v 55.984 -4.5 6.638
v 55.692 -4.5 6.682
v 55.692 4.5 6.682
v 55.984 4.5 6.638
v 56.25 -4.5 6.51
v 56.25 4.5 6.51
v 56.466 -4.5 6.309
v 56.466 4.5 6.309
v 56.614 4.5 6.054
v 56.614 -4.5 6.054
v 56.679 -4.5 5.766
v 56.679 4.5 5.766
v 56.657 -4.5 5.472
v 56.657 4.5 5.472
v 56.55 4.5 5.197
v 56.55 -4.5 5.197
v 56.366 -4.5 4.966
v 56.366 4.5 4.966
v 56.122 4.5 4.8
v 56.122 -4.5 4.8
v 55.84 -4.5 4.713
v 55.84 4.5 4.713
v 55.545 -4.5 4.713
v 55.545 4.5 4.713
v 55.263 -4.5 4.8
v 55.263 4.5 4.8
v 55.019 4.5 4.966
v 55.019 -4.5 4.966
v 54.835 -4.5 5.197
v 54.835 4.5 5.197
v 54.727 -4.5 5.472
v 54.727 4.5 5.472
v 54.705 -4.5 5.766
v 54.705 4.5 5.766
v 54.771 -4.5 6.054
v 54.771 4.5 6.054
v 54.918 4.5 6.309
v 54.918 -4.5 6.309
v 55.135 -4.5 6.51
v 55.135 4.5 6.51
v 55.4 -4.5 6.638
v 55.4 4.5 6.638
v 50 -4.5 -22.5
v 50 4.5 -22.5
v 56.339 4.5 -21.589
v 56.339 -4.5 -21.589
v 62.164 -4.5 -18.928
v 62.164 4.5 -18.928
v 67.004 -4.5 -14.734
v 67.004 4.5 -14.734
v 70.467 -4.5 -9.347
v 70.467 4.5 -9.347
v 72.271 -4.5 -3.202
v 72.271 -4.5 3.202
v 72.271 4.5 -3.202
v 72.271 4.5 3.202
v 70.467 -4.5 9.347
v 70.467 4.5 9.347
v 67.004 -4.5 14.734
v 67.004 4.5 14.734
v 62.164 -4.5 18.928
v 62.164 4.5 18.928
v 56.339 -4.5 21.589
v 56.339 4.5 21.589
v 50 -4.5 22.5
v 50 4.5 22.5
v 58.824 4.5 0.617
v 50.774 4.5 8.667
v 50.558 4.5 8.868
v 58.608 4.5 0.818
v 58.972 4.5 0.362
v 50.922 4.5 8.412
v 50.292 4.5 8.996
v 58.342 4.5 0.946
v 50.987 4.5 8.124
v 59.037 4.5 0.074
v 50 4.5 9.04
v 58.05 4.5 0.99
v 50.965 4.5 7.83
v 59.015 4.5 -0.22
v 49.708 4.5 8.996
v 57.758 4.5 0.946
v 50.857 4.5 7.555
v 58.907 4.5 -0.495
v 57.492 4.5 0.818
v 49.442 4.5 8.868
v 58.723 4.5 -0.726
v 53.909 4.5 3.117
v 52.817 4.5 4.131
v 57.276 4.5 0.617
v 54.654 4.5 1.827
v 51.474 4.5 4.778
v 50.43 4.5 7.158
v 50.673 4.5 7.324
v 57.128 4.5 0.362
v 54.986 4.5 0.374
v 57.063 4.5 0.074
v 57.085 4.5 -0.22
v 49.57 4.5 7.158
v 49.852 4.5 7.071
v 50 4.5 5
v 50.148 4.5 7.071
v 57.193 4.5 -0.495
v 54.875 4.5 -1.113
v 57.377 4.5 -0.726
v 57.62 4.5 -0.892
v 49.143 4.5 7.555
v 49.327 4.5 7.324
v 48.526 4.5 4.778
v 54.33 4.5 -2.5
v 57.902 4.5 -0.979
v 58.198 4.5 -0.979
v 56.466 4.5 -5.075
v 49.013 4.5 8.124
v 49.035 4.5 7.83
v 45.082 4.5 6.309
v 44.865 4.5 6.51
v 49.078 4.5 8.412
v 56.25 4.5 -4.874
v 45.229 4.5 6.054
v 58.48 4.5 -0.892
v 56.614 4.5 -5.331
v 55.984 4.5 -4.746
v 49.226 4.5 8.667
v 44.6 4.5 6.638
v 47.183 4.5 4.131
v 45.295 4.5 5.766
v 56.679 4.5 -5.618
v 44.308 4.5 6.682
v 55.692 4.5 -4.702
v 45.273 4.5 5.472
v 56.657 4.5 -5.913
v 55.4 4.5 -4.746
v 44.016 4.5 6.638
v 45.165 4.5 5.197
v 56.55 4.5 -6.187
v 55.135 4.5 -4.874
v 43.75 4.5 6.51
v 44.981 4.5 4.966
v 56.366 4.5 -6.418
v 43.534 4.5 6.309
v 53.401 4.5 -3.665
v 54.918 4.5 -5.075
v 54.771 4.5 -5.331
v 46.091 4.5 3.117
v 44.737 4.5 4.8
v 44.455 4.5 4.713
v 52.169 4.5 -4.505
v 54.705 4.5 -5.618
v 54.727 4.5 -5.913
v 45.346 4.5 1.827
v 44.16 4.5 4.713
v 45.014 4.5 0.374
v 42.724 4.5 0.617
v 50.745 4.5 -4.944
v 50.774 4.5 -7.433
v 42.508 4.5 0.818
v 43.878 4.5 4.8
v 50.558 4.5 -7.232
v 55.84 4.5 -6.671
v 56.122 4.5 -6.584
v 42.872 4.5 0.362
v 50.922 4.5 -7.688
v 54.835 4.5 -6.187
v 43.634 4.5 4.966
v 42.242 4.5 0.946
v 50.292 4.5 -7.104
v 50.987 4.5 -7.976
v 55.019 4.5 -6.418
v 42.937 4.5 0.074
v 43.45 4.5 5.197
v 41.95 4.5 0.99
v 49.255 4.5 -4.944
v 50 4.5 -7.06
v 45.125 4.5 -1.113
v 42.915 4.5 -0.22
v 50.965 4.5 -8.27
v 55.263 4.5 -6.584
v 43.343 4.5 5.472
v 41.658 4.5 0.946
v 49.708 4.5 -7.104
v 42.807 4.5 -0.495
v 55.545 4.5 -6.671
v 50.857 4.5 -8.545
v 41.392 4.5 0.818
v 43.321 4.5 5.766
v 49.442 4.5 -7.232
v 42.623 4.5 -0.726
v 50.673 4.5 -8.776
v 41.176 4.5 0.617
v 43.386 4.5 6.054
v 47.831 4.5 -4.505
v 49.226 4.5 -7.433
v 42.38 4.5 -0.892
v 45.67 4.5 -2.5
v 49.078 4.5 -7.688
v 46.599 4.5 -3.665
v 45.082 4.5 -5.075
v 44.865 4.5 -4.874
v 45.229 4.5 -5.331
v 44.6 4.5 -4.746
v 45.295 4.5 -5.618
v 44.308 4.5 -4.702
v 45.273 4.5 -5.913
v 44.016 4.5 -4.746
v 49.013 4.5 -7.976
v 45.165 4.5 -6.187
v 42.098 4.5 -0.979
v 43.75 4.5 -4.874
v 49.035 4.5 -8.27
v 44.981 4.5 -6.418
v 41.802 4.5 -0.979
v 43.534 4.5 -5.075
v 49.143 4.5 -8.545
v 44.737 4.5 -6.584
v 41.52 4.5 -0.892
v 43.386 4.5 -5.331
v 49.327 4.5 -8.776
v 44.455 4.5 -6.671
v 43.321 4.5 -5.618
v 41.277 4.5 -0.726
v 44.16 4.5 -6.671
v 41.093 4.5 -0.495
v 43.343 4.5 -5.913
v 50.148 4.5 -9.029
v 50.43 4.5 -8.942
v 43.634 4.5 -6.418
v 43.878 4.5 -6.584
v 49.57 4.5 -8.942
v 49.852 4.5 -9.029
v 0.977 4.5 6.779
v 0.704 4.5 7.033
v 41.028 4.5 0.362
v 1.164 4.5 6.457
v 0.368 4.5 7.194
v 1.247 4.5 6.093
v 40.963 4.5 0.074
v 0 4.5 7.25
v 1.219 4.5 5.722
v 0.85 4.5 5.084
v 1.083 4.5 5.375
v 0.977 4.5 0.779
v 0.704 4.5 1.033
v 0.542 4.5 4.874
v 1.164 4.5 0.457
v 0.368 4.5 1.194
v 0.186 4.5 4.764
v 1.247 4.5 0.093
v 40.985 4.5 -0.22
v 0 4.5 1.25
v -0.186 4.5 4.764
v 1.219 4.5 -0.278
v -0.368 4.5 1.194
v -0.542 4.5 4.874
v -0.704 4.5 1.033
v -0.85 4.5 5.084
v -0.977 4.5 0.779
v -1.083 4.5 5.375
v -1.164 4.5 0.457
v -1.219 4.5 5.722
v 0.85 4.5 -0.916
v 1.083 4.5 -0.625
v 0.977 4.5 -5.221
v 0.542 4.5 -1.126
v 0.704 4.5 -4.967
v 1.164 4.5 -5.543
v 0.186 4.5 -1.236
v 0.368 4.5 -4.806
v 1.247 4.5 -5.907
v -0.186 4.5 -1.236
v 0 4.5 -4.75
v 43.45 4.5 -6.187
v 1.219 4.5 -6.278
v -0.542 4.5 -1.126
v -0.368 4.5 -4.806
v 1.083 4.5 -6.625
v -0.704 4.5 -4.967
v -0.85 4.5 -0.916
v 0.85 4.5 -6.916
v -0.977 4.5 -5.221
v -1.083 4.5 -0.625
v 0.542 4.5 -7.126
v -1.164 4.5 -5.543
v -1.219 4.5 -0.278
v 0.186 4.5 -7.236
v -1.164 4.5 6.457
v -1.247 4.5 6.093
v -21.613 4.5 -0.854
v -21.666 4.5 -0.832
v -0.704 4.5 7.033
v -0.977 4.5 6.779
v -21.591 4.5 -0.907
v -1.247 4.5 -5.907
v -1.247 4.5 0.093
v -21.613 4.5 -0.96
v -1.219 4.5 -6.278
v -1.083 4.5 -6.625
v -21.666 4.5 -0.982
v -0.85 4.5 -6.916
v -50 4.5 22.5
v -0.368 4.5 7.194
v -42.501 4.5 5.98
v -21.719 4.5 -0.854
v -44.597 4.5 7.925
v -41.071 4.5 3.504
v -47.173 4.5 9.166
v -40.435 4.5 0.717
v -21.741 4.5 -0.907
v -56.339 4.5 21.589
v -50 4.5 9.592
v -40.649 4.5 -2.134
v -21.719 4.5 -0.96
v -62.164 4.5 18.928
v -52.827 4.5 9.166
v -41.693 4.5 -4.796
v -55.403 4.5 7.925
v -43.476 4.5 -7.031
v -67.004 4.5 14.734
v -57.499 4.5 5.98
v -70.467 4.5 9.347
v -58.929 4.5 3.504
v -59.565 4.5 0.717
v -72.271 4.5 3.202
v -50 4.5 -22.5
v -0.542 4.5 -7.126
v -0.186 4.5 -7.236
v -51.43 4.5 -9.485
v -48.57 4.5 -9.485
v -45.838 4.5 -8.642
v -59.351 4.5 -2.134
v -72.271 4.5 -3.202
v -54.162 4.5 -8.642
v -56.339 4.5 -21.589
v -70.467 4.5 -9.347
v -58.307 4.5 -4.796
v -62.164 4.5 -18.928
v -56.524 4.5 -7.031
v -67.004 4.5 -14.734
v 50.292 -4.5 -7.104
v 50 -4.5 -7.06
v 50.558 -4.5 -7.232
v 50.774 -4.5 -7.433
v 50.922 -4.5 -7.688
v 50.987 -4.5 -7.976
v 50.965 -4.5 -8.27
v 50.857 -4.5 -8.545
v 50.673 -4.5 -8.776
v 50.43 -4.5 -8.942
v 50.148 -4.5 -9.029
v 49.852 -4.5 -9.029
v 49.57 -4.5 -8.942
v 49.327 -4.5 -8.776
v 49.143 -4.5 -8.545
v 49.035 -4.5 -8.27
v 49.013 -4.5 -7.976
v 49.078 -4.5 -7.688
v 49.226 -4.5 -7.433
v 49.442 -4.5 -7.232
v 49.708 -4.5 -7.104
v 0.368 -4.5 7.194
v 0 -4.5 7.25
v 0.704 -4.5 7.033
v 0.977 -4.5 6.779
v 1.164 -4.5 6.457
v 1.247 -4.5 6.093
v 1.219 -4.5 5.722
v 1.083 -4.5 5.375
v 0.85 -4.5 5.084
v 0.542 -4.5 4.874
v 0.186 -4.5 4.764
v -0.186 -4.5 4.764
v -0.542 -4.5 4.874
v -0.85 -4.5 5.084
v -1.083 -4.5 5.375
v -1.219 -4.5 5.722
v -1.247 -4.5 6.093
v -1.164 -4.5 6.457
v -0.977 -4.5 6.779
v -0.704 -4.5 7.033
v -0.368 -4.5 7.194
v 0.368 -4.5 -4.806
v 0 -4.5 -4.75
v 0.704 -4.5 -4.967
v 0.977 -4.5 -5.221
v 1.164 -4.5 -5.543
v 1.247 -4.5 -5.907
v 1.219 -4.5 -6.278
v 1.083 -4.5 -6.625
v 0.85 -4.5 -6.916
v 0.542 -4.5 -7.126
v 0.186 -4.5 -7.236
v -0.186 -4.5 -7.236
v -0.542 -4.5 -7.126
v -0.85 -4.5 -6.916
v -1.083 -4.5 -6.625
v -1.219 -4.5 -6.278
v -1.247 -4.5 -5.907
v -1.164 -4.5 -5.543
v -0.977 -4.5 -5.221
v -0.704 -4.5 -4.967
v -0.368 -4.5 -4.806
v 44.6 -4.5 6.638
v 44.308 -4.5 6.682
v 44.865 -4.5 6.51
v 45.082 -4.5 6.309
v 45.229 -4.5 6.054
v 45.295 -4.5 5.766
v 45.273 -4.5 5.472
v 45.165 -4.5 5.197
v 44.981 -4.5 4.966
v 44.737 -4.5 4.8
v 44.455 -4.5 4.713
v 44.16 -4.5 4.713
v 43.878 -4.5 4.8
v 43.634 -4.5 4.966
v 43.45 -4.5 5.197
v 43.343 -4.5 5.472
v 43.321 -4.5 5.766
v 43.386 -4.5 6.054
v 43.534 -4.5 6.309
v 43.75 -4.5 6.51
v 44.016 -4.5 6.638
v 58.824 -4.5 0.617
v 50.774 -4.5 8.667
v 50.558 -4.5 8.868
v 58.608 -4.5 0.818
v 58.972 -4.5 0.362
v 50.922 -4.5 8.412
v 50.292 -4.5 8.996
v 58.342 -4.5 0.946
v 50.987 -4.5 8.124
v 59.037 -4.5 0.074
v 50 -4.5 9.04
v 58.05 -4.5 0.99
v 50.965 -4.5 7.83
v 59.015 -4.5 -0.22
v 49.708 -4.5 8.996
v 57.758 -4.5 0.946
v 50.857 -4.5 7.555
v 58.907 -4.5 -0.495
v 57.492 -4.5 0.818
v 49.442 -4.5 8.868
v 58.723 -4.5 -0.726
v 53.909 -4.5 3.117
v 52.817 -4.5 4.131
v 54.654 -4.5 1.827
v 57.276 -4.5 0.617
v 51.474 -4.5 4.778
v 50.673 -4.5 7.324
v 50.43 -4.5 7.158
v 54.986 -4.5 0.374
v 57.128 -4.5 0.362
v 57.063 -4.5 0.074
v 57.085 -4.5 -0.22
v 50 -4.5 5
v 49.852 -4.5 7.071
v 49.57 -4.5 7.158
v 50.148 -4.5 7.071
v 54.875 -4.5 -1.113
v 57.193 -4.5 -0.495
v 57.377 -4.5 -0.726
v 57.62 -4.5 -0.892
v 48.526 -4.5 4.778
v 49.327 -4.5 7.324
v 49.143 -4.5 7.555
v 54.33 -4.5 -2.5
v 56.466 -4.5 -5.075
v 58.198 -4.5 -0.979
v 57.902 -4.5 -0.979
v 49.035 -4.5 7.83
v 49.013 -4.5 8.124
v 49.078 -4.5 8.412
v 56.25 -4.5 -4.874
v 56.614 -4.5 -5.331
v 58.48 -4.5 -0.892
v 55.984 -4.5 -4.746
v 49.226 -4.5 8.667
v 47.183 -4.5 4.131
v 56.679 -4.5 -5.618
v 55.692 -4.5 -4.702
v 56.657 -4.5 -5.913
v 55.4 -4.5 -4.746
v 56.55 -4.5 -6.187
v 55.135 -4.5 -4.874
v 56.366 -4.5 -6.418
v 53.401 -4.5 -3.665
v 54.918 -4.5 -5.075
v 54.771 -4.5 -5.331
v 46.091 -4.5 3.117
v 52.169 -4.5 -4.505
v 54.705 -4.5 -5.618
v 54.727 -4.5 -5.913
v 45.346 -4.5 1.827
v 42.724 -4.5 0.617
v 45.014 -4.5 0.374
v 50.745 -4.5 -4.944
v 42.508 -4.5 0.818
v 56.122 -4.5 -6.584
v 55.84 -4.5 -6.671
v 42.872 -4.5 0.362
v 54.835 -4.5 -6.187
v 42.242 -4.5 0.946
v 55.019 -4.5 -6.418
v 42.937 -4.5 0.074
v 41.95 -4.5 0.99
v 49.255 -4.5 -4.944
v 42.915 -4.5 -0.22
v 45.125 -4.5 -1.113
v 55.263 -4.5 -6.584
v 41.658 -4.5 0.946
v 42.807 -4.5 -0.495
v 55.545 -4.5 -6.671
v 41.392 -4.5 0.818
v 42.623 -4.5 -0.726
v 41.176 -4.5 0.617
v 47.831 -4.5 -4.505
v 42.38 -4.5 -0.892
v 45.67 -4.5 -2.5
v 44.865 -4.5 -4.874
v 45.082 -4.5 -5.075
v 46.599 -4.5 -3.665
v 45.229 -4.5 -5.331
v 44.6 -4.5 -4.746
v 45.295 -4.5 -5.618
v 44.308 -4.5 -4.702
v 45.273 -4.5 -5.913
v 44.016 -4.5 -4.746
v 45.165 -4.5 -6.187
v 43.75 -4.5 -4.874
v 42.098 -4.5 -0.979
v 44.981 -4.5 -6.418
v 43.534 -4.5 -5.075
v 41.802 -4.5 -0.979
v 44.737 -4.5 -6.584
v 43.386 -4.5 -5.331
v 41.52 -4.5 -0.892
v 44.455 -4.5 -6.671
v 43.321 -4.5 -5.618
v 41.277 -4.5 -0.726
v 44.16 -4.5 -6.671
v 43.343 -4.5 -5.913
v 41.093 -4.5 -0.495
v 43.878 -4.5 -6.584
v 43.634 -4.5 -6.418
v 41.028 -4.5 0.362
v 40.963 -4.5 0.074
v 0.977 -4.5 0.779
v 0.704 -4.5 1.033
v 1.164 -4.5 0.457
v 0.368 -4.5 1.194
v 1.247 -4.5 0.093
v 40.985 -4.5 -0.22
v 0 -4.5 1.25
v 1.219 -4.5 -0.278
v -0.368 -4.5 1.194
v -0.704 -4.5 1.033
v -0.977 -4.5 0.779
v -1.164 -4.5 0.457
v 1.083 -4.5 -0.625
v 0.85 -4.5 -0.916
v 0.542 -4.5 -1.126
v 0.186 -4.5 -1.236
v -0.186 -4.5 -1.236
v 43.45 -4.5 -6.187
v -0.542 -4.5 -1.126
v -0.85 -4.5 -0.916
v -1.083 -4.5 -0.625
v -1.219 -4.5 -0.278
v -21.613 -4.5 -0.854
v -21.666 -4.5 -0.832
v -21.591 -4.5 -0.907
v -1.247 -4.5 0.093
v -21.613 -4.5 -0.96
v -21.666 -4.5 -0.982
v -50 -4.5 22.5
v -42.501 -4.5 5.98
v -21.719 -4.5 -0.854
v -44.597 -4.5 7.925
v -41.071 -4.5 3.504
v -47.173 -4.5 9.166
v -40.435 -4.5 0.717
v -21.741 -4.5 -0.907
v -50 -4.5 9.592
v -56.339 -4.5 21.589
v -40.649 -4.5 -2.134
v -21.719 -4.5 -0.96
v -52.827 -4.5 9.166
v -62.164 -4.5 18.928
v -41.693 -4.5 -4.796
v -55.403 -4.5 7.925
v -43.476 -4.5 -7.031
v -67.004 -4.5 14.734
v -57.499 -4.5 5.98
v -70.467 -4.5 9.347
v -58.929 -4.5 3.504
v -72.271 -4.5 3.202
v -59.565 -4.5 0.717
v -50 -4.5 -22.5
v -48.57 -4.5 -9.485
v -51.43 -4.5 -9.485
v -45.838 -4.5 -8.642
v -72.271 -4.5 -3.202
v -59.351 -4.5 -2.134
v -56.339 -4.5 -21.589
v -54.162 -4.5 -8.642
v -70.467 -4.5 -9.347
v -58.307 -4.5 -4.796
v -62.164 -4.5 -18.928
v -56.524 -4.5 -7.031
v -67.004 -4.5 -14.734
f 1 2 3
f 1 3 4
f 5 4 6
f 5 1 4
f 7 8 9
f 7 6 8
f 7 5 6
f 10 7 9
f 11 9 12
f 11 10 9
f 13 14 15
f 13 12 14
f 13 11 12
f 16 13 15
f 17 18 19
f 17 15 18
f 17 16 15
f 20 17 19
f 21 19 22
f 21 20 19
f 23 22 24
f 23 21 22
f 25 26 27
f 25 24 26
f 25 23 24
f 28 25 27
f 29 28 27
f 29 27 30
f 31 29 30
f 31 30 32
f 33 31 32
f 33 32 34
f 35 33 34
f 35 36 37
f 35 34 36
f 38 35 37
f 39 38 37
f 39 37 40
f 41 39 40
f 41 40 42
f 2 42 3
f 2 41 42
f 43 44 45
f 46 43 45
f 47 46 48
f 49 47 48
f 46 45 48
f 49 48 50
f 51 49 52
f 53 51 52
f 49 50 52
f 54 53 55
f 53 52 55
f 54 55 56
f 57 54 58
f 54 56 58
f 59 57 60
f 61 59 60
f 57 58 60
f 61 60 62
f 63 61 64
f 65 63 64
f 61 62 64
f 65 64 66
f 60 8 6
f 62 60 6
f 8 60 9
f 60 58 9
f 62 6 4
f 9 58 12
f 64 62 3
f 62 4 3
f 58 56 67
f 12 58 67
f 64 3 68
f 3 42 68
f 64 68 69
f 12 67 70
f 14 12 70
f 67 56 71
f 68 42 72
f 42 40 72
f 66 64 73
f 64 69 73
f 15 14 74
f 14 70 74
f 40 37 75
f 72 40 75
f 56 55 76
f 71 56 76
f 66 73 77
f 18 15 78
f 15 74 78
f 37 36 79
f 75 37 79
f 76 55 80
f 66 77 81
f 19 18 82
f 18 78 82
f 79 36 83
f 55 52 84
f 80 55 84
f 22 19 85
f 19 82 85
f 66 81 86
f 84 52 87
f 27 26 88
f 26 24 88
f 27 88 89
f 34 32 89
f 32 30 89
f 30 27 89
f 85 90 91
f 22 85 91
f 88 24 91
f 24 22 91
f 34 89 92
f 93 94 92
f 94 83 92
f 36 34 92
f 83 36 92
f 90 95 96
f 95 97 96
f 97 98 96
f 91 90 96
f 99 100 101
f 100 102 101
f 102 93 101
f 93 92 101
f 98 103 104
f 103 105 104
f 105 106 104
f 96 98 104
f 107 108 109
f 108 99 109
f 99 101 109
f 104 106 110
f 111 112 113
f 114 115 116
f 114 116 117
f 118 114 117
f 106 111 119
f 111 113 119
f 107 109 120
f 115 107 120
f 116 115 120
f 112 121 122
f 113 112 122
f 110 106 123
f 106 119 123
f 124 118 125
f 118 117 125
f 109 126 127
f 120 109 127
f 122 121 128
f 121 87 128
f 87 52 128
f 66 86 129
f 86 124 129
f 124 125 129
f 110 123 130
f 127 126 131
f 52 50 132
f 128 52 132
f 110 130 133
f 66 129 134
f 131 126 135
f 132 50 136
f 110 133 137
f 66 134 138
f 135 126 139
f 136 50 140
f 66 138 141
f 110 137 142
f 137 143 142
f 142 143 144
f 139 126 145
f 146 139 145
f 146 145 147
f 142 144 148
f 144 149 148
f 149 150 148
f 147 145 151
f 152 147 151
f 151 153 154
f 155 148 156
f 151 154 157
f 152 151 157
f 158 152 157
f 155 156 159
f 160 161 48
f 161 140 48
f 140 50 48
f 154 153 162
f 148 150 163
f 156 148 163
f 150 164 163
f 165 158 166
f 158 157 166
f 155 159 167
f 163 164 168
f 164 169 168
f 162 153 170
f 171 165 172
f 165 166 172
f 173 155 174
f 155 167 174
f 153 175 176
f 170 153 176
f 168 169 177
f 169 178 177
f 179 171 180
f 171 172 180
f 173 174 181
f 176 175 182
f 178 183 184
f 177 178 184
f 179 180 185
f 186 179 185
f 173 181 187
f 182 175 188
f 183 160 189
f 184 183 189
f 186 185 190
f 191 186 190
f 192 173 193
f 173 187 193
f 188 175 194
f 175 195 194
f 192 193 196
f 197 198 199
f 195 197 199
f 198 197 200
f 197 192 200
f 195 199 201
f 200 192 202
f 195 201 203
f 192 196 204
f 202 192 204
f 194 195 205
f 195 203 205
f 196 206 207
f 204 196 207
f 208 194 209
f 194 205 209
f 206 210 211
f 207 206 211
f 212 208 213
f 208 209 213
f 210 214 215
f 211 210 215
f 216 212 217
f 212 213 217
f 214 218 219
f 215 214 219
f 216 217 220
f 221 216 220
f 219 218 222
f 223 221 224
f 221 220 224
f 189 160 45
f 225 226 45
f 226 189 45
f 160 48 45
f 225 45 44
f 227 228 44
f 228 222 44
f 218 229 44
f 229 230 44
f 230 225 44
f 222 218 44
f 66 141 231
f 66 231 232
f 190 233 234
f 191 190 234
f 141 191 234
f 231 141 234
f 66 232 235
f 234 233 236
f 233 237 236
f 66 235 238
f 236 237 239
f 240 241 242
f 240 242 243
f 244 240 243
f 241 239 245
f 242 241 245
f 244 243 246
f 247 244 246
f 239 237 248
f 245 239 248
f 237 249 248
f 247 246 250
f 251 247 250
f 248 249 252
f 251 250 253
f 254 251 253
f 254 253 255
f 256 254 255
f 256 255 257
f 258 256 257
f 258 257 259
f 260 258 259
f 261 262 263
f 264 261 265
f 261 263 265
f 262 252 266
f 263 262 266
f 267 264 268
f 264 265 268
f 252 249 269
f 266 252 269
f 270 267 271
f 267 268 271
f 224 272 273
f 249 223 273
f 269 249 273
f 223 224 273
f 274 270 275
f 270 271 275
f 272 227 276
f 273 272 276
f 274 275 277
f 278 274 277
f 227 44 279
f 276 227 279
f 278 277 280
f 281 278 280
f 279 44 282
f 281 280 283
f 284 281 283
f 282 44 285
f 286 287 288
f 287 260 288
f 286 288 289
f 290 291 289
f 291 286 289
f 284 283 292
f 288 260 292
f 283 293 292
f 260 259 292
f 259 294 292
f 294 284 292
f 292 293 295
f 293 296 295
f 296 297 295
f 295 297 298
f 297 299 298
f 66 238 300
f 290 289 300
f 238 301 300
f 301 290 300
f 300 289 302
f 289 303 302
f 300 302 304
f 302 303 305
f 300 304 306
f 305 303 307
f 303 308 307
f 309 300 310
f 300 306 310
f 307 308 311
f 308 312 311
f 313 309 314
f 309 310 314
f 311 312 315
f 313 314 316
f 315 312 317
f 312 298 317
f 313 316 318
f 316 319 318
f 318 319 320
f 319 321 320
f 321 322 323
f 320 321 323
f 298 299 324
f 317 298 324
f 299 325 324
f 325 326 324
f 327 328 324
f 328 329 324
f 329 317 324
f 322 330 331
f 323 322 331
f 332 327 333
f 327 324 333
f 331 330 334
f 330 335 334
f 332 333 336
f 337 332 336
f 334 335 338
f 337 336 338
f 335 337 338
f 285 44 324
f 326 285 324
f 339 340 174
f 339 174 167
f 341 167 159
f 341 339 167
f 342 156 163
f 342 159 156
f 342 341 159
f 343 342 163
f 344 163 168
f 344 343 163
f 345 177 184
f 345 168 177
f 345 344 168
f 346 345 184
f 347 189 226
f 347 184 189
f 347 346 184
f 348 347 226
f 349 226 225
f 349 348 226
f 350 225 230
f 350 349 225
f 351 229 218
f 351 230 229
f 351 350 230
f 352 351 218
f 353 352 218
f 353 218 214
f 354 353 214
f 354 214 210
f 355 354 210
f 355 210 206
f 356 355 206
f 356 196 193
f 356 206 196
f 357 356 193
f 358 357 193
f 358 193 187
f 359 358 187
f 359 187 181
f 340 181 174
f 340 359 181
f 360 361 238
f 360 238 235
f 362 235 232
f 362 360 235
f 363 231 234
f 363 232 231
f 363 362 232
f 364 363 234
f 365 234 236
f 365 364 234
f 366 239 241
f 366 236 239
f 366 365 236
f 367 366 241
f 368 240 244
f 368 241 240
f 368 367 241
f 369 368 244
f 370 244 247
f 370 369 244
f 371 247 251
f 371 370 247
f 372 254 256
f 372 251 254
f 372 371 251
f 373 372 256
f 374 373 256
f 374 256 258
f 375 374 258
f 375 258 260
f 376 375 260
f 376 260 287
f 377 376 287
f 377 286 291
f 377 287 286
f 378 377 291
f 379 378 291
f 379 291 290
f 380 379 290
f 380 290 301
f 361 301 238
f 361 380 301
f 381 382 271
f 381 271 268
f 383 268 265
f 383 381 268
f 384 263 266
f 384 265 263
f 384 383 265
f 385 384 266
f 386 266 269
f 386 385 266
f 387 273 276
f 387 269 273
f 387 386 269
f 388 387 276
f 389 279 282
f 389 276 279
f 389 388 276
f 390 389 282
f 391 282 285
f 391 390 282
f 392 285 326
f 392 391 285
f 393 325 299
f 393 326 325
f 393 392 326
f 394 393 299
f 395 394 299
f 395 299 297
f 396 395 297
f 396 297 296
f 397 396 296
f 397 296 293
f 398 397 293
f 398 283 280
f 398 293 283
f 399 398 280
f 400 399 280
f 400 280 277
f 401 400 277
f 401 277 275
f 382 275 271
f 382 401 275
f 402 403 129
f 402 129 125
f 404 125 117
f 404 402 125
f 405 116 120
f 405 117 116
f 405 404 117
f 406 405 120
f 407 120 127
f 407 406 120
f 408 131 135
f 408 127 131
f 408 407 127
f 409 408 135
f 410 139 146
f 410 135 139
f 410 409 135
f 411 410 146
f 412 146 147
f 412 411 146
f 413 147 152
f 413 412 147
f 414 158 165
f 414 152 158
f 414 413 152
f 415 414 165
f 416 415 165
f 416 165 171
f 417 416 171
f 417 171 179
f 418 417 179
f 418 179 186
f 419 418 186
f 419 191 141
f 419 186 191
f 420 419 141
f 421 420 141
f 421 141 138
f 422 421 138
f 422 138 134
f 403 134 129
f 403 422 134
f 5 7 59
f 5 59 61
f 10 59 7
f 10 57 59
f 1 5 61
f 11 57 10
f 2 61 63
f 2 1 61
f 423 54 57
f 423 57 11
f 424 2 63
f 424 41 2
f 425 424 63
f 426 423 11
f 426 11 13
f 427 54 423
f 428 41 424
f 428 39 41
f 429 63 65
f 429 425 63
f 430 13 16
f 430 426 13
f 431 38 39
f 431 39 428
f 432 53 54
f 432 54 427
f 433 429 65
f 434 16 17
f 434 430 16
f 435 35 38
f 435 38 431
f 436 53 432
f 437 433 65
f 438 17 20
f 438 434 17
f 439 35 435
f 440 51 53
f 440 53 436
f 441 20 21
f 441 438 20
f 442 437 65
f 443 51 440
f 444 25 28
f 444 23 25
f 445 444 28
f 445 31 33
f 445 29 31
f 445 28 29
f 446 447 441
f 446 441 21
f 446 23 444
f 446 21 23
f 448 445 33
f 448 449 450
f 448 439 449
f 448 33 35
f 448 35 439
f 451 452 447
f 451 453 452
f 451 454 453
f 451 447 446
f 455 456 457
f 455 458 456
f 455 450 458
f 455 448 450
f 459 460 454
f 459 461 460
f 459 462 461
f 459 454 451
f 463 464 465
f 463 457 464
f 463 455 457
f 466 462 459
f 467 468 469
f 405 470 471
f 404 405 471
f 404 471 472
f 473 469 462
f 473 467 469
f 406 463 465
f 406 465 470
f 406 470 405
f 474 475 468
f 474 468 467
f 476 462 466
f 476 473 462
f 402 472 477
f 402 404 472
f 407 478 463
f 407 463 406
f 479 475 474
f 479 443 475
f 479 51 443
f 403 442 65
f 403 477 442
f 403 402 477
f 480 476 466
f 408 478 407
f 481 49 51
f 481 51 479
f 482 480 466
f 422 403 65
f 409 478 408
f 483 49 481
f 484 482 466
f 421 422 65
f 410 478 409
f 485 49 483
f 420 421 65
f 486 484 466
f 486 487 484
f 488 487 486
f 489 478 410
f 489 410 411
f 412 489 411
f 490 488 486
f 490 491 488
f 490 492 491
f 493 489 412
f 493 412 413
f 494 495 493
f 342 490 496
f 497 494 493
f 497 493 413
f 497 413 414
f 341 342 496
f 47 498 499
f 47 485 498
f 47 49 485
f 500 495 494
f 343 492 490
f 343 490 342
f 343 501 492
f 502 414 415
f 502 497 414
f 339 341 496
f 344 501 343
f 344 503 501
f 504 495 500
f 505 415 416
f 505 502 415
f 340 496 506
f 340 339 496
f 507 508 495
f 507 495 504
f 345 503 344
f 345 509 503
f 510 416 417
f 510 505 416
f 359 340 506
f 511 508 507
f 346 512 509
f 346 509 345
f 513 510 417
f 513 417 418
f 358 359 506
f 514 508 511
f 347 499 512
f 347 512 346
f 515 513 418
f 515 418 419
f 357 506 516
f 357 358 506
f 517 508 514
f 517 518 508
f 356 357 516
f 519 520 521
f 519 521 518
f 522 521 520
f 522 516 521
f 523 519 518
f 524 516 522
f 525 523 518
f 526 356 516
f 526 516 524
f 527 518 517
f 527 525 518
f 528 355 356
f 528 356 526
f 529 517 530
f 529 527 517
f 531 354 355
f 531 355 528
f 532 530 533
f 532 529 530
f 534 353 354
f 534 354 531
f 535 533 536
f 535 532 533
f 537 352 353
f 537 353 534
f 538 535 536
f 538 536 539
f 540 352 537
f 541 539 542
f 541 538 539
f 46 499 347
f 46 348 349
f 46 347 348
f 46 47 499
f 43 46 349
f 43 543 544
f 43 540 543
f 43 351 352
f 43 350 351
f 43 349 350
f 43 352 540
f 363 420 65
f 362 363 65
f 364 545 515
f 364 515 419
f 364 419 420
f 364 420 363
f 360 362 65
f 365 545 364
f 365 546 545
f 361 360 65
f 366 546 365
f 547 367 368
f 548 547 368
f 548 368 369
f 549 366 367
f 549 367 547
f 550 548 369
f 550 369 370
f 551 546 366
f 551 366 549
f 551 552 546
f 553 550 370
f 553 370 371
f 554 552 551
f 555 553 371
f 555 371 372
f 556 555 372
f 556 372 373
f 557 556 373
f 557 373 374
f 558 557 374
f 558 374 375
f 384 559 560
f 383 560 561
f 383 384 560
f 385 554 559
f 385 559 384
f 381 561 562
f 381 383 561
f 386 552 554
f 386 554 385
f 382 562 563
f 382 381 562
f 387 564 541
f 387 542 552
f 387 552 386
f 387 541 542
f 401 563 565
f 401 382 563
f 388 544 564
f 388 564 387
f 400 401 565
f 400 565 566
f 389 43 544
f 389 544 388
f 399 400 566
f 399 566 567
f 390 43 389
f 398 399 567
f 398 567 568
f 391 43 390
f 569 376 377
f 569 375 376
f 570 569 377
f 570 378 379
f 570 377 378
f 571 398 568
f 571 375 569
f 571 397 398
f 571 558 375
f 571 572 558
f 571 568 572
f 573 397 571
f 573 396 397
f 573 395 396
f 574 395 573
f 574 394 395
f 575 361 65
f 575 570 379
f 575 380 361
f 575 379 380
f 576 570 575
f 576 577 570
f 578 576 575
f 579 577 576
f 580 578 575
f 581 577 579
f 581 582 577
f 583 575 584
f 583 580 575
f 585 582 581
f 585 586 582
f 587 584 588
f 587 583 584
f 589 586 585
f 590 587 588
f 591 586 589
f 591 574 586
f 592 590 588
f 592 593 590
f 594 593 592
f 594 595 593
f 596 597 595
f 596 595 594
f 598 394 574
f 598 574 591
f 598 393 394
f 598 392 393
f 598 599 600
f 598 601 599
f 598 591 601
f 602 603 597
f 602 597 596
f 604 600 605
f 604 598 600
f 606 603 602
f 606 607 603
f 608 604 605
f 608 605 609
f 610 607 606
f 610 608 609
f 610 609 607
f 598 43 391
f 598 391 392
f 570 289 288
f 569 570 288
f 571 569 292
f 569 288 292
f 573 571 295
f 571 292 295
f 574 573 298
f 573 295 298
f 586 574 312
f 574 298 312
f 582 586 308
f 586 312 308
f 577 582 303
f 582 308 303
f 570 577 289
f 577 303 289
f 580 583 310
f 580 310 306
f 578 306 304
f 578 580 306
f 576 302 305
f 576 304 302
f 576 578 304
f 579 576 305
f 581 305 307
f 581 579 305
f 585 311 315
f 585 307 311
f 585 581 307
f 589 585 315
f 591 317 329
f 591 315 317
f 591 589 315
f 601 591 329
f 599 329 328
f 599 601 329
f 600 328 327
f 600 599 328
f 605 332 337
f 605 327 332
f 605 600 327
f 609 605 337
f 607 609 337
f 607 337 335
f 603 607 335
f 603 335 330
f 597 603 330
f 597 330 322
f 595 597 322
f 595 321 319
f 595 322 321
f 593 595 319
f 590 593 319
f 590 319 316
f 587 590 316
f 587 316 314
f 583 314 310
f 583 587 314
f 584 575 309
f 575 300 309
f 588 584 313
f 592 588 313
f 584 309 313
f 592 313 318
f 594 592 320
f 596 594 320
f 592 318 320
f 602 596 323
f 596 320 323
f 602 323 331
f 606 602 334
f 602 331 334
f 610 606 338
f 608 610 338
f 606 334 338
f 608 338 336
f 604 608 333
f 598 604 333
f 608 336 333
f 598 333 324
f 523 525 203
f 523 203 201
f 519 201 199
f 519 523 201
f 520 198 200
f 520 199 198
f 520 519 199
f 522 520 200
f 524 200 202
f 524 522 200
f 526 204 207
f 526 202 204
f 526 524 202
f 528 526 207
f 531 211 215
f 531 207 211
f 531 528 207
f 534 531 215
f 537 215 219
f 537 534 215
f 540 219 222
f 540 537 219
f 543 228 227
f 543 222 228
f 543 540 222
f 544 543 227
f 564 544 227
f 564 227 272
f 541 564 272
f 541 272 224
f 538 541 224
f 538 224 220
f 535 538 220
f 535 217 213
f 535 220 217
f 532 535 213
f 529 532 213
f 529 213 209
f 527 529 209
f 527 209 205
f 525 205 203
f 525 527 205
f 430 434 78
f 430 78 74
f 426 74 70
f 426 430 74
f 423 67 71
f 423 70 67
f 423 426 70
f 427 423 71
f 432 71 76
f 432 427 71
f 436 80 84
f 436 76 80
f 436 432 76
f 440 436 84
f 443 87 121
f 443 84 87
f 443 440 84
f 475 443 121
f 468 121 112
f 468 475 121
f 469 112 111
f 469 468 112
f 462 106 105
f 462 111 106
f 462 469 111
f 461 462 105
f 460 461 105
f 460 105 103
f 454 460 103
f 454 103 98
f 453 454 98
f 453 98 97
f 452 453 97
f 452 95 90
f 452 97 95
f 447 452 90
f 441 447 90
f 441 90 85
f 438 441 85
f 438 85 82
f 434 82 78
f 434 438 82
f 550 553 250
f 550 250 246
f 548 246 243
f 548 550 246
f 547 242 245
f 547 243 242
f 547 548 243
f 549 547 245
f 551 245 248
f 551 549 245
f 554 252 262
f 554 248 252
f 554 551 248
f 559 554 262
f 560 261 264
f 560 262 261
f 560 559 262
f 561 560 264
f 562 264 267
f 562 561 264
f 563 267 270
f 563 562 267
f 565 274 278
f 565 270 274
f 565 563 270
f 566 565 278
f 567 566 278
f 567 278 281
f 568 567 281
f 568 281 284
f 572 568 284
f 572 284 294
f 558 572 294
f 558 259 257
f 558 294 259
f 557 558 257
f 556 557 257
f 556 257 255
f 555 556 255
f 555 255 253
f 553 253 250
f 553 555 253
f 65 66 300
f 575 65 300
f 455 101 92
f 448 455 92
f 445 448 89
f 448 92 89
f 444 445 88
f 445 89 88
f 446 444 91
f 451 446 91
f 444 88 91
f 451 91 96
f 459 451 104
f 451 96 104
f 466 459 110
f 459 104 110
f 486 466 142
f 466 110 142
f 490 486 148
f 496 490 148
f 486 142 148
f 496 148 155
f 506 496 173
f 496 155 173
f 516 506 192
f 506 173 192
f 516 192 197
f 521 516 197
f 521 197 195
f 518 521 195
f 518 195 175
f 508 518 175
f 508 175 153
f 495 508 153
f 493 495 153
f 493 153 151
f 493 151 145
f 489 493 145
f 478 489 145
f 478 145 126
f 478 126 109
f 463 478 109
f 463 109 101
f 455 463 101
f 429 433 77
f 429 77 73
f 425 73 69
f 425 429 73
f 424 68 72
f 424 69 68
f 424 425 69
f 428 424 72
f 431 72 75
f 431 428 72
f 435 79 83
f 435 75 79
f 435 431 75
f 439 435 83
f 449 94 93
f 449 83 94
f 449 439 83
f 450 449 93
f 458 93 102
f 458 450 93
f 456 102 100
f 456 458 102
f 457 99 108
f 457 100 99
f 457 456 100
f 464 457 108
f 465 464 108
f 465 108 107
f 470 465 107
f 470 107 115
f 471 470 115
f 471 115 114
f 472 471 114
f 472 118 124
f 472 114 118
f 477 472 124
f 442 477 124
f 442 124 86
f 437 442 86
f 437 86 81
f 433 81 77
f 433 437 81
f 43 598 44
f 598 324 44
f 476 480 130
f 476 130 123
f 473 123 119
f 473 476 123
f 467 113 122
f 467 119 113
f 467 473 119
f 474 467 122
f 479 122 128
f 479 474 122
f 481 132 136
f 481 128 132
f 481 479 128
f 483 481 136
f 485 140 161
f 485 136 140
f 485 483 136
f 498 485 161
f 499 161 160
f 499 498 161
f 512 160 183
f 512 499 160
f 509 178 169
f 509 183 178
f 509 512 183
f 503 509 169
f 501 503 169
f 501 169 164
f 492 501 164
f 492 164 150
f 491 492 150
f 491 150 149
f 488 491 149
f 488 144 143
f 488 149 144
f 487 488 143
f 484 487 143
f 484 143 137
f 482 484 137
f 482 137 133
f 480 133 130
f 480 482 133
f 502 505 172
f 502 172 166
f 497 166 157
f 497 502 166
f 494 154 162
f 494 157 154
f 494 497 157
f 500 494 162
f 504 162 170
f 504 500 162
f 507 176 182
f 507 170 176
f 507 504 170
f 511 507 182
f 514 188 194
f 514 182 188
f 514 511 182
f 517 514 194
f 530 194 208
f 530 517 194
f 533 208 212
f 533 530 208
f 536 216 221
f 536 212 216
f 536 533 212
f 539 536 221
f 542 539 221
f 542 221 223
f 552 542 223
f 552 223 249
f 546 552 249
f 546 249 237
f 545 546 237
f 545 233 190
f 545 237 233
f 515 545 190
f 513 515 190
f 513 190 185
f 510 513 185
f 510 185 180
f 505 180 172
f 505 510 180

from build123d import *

# Parameters (mm, degrees)
BOSS_EXTRUDE1_DEPTH          = 4.5
CUT_EXTRUDE1_DEPTH           = 77.442789065
CUT_EXTRUDE1_DEPTH_BACK      = 77.442789065
SKETCH3_R                    = 0.99
SKETCH4_R                    = 5
CUT_EXTRUDE2_DEPTH           = 77.442789065
CUT_EXTRUDE3_DEPTH           = 77.442789065
CUT_EXTRUDE3_DEPTH_BACK      = 77.442789065
SKETCH5_R                    = 1.25
CUT_EXTRUDE4_DEPTH           = 77.442789065
CUT_EXTRUDE4_DEPTH_BACK      = 77.442789065
SKETCH6_R                    = 9.591798866
F_97_0_0059_DIAMETER_HOLE1_D = 0.14986


with BuildPart() as part:
    # Sketch2 → Boss-Extrude1 (new, symmetric)
    with BuildSketch(Plane(origin=(0, 0, 0), x_dir=(1, 0, 0), z_dir=(0, 1, 0))):
        with BuildLine():
            Line((50, -22.5), (-50, -22.5))
            ThreePointArc((-50, -22.5), (-72.5, 0), (-50, 22.5))
            Line((-50, 22.5), (50, 22.5))
            ThreePointArc((50, 22.5), (72.5, 0), (50, -22.5))
        make_face()
    extrude(amount=BOSS_EXTRUDE1_DEPTH, both=True)

    # Sketch3 → Cut-Extrude1 (cut, two sides: drawn at the far end of the back side and taken through both)
    with BuildSketch(Plane(origin=(0, 4.5, 0), x_dir=(1, 0, 0), z_dir=(0, 1, 0)).offset(-CUT_EXTRUDE1_DEPTH_BACK)):
        with Locations(Location((41.95, 0, 0), (0, 0, 270))):
            Circle(SKETCH3_R)
        with Locations(Location((44.307790411, 5.692209589, 0), (0, 0, 270))):
            Circle(SKETCH3_R)
        with Locations(Location((50, 8.05, 0), (0, 0, 270))):
            Circle(SKETCH3_R)
        with Locations(Location((55.692209589, 5.692209589, 0), (0, 0, 270))):
            Circle(SKETCH3_R)
        with Locations(Location((58.05, 0, 0), (0, 0, 270))):
            Circle(SKETCH3_R)
        with Locations(Location((55.692209589, -5.692209589, 0), (0, 0, 270))):
            Circle(SKETCH3_R)
        with Locations(Location((50, -8.05, 0), (0, 0, 270))):
            Circle(SKETCH3_R)
        with Locations(Location((44.307790411, -5.692209589, 0), (0, 0, 270))):
            Circle(SKETCH3_R)
    extrude(amount=CUT_EXTRUDE1_DEPTH + CUT_EXTRUDE1_DEPTH_BACK, mode=Mode.SUBTRACT)

    # Sketch4 → Cut-Extrude2 (cut, through all)
    with BuildSketch(Plane(origin=(0, 4.5, 0), x_dir=(1, 0, 0), z_dir=(0, 1, 0))):
        with Locations(Location((50, 0, 0), (0, 0, 270))):
            Circle(SKETCH4_R)
    extrude(amount=-CUT_EXTRUDE2_DEPTH, mode=Mode.SUBTRACT)

    # Sketch5 → Cut-Extrude3 (cut, two sides: drawn at the far end of the back side and taken through both)
    with BuildSketch(Plane(origin=(0, 4.5, 0), x_dir=(1, 0, 0), z_dir=(0, 1, 0)).offset(-CUT_EXTRUDE3_DEPTH_BACK)):
        with Locations(Location((0, 6, 0), (0, 0, 270))):
            Circle(SKETCH5_R)
        with Locations(Location((0, 0, 0), (0, 0, 270))):
            Circle(SKETCH5_R)
        with Locations(Location((0, -6, 0), (0, 0, 270))):
            Circle(SKETCH5_R)
    extrude(amount=CUT_EXTRUDE3_DEPTH + CUT_EXTRUDE3_DEPTH_BACK, mode=Mode.SUBTRACT)

    # Sketch6 → Cut-Extrude4 (cut, two sides: drawn at the far end of the back side and taken through both)
    with BuildSketch(Plane(origin=(0, 4.5, 0), x_dir=(1, 0, 0), z_dir=(0, 1, 0)).offset(-CUT_EXTRUDE4_DEPTH_BACK)):
        with Locations(Location((-50, 0, 0), (0, 0, 270))):
            Circle(SKETCH6_R)
    extrude(amount=CUT_EXTRUDE4_DEPTH + CUT_EXTRUDE4_DEPTH_BACK, mode=Mode.SUBTRACT)

    # #97 (0.0059) Diameter Hole1 (through all)
    with Locations(Plane(origin=(-21.665942964, -4.5, -0.906896611), x_dir=(0, 0, -1), z_dir=(0, -1, 0))):
        with Locations((0, 0)):
            Hole(F_97_0_0059_DIAMETER_HOLE1_D / 2)


solid = part.part
